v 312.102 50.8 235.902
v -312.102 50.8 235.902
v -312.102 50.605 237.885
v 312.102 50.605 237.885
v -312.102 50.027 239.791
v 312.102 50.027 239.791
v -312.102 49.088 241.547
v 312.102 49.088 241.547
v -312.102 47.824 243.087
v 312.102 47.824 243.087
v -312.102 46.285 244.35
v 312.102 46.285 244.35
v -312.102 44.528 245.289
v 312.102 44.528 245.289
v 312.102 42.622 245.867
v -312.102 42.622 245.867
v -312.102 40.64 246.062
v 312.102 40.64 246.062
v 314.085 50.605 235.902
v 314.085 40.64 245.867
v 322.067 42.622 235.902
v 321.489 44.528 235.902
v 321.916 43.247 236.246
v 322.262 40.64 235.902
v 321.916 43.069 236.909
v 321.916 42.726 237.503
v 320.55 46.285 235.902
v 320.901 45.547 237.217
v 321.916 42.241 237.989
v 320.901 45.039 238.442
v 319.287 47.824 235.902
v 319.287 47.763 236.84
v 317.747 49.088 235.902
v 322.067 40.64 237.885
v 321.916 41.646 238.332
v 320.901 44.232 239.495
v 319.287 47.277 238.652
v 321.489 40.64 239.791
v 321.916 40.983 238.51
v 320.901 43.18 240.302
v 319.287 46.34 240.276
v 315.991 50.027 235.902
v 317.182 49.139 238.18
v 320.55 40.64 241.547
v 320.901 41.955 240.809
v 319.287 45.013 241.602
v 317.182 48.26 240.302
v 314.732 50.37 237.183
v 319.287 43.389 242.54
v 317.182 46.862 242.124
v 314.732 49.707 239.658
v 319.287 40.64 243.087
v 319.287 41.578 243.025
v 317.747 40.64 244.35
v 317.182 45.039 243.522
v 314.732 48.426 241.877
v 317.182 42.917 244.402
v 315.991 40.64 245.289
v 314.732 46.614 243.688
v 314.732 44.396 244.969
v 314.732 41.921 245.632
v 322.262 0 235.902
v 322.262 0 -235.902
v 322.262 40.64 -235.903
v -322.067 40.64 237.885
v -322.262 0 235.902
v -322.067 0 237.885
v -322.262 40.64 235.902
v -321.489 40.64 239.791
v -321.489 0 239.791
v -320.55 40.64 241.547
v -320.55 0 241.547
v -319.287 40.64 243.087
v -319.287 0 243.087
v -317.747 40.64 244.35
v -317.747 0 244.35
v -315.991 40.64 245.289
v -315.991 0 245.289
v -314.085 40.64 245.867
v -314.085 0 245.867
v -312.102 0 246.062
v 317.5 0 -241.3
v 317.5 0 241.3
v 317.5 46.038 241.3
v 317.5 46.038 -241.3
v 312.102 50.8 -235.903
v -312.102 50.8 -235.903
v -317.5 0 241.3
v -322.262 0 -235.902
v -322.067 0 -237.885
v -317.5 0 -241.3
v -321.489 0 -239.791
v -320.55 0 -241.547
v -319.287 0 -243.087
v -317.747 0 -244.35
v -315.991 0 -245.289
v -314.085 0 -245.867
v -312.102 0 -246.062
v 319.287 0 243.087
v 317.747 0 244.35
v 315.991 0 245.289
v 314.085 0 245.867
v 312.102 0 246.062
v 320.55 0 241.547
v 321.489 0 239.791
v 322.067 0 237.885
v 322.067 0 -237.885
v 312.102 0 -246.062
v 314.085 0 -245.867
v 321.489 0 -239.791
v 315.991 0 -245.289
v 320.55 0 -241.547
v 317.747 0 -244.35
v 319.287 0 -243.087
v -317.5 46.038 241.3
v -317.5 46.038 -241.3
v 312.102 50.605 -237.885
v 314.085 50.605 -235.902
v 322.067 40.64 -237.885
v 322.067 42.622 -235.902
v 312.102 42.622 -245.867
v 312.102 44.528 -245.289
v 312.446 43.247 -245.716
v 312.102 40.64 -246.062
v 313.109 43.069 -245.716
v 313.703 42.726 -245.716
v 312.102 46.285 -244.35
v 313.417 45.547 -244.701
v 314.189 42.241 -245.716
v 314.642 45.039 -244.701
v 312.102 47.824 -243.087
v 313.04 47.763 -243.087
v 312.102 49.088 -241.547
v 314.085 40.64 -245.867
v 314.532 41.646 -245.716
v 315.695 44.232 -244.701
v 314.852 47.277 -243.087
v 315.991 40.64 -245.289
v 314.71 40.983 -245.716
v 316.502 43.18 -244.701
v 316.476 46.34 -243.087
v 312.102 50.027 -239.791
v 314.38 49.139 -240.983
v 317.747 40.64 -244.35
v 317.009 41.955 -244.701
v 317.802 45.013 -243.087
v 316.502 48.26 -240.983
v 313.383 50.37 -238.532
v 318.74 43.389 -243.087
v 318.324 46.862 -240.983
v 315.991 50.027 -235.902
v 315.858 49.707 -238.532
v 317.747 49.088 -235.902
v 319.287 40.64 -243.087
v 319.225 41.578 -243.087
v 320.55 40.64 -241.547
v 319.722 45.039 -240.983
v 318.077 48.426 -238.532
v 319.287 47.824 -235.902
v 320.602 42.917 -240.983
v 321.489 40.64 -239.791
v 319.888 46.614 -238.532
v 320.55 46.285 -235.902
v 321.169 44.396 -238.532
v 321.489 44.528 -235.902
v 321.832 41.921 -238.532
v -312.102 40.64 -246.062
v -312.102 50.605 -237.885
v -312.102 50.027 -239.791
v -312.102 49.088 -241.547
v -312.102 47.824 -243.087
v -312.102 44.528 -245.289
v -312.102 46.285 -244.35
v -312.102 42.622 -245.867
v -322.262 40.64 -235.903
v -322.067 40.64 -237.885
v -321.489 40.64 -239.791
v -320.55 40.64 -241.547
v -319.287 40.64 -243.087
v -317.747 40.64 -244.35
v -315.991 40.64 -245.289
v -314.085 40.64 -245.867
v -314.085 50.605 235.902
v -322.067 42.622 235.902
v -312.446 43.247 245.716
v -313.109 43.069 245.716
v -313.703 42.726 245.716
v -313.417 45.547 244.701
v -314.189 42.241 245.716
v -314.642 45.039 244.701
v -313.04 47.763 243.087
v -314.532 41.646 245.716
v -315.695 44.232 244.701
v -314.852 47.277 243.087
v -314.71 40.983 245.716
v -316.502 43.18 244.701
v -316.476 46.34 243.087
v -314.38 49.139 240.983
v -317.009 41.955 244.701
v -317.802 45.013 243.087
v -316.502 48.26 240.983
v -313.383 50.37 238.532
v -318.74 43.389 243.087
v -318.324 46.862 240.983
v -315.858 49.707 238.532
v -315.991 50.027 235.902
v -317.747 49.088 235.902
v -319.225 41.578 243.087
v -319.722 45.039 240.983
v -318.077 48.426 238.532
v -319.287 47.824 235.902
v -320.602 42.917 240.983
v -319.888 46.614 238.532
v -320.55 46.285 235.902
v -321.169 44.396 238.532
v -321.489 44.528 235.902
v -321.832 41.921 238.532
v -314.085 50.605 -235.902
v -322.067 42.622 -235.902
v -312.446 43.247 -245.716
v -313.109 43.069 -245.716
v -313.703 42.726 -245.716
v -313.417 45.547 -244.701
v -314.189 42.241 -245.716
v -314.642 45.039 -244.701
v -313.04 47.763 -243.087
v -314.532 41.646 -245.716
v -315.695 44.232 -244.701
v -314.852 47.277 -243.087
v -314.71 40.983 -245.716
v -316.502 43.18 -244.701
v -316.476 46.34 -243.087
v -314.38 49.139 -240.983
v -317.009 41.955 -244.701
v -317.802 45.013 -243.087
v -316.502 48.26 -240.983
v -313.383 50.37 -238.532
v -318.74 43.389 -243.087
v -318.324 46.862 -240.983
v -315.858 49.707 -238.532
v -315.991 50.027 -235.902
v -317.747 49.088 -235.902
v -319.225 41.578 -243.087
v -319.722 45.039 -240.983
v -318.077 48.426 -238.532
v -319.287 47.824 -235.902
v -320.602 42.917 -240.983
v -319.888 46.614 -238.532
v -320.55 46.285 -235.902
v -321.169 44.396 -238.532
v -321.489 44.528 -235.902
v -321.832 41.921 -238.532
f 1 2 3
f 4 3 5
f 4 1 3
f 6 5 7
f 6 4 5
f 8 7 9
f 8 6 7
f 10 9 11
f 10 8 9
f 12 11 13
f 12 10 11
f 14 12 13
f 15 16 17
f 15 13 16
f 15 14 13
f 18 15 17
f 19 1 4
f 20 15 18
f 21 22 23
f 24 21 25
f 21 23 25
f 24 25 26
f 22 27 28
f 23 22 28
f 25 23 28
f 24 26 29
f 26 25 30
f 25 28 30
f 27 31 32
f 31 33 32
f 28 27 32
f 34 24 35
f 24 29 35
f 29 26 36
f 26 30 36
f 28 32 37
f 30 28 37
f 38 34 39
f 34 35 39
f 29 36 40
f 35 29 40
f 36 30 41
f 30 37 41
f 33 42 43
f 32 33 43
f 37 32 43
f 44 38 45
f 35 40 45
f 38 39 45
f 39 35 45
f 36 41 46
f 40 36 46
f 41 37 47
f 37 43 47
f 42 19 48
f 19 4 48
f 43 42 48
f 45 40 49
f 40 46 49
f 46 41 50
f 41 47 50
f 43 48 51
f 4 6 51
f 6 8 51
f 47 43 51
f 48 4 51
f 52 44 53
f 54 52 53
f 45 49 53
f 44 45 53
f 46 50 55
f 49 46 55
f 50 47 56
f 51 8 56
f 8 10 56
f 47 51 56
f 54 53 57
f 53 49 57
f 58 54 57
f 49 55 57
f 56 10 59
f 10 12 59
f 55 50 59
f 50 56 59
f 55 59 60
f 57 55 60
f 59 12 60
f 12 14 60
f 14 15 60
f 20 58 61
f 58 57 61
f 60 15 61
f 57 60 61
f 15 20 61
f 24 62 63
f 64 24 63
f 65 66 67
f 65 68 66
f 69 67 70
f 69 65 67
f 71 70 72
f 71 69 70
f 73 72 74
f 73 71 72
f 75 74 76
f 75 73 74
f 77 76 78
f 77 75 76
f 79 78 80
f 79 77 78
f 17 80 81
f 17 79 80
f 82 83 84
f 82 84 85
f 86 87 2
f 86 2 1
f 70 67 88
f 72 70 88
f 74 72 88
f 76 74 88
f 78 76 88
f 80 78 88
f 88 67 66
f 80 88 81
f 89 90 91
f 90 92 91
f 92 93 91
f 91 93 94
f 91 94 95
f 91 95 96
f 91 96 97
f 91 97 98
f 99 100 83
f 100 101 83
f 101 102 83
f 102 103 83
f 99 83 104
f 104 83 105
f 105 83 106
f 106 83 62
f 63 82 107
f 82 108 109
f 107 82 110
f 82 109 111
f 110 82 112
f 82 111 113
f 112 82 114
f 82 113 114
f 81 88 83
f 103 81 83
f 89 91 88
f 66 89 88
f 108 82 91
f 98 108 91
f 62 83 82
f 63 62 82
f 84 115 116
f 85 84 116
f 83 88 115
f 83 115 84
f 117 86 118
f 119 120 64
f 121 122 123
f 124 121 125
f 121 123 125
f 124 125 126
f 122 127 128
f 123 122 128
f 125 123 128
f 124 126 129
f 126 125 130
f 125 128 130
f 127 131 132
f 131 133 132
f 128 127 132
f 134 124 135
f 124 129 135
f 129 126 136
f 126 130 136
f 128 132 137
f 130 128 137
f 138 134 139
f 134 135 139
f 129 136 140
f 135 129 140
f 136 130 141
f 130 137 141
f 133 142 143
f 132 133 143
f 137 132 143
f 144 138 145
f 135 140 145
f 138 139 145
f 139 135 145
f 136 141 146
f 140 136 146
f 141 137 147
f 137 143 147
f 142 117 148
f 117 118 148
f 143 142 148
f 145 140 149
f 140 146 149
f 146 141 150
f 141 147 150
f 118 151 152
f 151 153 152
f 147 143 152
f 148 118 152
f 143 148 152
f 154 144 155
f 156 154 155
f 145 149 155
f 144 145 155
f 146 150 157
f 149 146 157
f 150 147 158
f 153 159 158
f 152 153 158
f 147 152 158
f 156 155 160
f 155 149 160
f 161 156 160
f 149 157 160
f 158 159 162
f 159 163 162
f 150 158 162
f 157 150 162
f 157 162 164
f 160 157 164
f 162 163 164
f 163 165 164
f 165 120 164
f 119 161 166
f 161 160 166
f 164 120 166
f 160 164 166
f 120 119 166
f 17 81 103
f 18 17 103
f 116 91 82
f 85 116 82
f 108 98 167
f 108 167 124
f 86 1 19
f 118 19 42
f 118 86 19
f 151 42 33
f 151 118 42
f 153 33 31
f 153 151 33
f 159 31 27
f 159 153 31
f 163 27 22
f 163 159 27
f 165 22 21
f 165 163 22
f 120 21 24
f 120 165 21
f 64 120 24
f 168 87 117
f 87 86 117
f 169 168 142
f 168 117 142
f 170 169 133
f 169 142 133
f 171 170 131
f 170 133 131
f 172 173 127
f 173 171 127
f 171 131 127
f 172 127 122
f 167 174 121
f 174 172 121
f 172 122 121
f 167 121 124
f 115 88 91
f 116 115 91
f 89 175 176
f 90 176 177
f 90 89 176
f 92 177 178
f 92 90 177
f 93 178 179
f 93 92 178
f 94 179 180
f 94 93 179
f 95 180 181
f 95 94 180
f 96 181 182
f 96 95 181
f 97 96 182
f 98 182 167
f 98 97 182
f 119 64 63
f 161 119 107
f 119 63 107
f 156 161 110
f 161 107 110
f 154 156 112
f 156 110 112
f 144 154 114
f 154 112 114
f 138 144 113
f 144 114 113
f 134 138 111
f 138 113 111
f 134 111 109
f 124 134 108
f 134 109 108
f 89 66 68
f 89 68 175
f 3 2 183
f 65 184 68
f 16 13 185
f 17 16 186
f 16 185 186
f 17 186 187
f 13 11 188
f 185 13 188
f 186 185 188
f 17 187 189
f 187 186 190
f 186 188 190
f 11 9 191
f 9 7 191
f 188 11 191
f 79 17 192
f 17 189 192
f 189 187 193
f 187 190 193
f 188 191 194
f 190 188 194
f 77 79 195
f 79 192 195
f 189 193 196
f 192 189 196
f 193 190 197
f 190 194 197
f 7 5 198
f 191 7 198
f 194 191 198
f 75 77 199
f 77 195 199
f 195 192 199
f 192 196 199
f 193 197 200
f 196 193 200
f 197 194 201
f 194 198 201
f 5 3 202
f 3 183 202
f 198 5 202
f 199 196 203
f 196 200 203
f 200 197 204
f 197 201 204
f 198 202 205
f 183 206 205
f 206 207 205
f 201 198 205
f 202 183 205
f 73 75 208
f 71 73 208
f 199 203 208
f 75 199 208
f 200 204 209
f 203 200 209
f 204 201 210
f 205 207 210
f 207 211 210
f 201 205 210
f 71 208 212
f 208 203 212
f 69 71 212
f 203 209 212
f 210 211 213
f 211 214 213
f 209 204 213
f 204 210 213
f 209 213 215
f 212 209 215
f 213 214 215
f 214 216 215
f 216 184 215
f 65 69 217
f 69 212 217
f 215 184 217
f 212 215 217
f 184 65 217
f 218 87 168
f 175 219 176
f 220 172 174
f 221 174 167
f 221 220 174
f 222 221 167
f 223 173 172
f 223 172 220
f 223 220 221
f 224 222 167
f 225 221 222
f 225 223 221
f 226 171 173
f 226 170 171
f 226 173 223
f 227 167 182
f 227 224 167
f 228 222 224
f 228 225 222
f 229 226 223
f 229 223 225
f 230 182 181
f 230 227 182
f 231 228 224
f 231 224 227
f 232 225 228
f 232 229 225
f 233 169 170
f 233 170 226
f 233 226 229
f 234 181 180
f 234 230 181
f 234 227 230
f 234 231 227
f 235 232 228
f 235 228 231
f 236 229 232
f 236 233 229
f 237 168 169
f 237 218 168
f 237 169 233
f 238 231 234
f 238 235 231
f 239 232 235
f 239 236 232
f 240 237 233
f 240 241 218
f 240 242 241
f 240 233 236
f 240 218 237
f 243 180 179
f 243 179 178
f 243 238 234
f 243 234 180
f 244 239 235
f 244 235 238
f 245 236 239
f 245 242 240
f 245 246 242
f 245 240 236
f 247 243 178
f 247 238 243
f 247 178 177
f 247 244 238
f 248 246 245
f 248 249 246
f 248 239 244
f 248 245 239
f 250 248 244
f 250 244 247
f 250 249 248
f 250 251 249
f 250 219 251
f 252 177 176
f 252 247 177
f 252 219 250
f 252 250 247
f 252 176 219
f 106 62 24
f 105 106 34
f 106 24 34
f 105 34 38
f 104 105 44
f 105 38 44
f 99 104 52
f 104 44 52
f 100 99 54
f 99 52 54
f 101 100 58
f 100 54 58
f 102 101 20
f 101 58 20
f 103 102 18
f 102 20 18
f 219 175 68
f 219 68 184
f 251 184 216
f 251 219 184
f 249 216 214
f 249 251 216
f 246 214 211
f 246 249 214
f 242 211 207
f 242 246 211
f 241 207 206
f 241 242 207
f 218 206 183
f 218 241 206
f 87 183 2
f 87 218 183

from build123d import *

# Parameters (mm, degrees)
SKETCH1_W           = 644.525
SKETCH1_H           = 492.125
SKETCH1_W_2         = 635
SKETCH1_H_2         = 482.6
BOSS_EXTRUDE1_DEPTH = 50.8
SKETCH2_W           = 492.125
SKETCH2_H           = 4.7625
BOSS_EXTRUDE2_DEPTH = 644.525
FILLET1_R           = 10.16


with BuildPart() as part:
    # Sketch1 → Boss-Extrude1 (new body)
    with BuildSketch(Plane(origin=(0, 0, 0), x_dir=(1, 0, 0), z_dir=(0, 1, 0))):
        Rectangle(SKETCH1_W, SKETCH1_H)
        Rectangle(SKETCH1_W_2, SKETCH1_H_2, mode=Mode.SUBTRACT)
    extrude(amount=BOSS_EXTRUDE1_DEPTH)

    # Sketch2 → Boss-Extrude2 (add)
    with BuildSketch(Plane(origin=(322.2625, 0, 0), x_dir=(0, 0, -1), z_dir=(1, 0, 0))):
        with Locations((0, 48.41875)):
            Rectangle(SKETCH2_W, SKETCH2_H)
    extrude(amount=-BOSS_EXTRUDE2_DEPTH)

    # Fillet1
    fillet1_edges = [part.edges().sort_by_distance(p)[0] for p in [
        (-322.2625, 50.8, 0),
        (0, 50.8, 246.0625),
        (322.2625, 50.8, 0),
        (0, 50.8, -246.0625),
        (322.2625, 25.4, 246.0625),
        (-322.2625, 25.4, 246.0625),
        (-322.2625, 25.4, -246.0625),
        (322.2625, 25.4, -246.0625),
    ]]
    fillet(fillet1_edges, radius=FILLET1_R)


solid = part.part
